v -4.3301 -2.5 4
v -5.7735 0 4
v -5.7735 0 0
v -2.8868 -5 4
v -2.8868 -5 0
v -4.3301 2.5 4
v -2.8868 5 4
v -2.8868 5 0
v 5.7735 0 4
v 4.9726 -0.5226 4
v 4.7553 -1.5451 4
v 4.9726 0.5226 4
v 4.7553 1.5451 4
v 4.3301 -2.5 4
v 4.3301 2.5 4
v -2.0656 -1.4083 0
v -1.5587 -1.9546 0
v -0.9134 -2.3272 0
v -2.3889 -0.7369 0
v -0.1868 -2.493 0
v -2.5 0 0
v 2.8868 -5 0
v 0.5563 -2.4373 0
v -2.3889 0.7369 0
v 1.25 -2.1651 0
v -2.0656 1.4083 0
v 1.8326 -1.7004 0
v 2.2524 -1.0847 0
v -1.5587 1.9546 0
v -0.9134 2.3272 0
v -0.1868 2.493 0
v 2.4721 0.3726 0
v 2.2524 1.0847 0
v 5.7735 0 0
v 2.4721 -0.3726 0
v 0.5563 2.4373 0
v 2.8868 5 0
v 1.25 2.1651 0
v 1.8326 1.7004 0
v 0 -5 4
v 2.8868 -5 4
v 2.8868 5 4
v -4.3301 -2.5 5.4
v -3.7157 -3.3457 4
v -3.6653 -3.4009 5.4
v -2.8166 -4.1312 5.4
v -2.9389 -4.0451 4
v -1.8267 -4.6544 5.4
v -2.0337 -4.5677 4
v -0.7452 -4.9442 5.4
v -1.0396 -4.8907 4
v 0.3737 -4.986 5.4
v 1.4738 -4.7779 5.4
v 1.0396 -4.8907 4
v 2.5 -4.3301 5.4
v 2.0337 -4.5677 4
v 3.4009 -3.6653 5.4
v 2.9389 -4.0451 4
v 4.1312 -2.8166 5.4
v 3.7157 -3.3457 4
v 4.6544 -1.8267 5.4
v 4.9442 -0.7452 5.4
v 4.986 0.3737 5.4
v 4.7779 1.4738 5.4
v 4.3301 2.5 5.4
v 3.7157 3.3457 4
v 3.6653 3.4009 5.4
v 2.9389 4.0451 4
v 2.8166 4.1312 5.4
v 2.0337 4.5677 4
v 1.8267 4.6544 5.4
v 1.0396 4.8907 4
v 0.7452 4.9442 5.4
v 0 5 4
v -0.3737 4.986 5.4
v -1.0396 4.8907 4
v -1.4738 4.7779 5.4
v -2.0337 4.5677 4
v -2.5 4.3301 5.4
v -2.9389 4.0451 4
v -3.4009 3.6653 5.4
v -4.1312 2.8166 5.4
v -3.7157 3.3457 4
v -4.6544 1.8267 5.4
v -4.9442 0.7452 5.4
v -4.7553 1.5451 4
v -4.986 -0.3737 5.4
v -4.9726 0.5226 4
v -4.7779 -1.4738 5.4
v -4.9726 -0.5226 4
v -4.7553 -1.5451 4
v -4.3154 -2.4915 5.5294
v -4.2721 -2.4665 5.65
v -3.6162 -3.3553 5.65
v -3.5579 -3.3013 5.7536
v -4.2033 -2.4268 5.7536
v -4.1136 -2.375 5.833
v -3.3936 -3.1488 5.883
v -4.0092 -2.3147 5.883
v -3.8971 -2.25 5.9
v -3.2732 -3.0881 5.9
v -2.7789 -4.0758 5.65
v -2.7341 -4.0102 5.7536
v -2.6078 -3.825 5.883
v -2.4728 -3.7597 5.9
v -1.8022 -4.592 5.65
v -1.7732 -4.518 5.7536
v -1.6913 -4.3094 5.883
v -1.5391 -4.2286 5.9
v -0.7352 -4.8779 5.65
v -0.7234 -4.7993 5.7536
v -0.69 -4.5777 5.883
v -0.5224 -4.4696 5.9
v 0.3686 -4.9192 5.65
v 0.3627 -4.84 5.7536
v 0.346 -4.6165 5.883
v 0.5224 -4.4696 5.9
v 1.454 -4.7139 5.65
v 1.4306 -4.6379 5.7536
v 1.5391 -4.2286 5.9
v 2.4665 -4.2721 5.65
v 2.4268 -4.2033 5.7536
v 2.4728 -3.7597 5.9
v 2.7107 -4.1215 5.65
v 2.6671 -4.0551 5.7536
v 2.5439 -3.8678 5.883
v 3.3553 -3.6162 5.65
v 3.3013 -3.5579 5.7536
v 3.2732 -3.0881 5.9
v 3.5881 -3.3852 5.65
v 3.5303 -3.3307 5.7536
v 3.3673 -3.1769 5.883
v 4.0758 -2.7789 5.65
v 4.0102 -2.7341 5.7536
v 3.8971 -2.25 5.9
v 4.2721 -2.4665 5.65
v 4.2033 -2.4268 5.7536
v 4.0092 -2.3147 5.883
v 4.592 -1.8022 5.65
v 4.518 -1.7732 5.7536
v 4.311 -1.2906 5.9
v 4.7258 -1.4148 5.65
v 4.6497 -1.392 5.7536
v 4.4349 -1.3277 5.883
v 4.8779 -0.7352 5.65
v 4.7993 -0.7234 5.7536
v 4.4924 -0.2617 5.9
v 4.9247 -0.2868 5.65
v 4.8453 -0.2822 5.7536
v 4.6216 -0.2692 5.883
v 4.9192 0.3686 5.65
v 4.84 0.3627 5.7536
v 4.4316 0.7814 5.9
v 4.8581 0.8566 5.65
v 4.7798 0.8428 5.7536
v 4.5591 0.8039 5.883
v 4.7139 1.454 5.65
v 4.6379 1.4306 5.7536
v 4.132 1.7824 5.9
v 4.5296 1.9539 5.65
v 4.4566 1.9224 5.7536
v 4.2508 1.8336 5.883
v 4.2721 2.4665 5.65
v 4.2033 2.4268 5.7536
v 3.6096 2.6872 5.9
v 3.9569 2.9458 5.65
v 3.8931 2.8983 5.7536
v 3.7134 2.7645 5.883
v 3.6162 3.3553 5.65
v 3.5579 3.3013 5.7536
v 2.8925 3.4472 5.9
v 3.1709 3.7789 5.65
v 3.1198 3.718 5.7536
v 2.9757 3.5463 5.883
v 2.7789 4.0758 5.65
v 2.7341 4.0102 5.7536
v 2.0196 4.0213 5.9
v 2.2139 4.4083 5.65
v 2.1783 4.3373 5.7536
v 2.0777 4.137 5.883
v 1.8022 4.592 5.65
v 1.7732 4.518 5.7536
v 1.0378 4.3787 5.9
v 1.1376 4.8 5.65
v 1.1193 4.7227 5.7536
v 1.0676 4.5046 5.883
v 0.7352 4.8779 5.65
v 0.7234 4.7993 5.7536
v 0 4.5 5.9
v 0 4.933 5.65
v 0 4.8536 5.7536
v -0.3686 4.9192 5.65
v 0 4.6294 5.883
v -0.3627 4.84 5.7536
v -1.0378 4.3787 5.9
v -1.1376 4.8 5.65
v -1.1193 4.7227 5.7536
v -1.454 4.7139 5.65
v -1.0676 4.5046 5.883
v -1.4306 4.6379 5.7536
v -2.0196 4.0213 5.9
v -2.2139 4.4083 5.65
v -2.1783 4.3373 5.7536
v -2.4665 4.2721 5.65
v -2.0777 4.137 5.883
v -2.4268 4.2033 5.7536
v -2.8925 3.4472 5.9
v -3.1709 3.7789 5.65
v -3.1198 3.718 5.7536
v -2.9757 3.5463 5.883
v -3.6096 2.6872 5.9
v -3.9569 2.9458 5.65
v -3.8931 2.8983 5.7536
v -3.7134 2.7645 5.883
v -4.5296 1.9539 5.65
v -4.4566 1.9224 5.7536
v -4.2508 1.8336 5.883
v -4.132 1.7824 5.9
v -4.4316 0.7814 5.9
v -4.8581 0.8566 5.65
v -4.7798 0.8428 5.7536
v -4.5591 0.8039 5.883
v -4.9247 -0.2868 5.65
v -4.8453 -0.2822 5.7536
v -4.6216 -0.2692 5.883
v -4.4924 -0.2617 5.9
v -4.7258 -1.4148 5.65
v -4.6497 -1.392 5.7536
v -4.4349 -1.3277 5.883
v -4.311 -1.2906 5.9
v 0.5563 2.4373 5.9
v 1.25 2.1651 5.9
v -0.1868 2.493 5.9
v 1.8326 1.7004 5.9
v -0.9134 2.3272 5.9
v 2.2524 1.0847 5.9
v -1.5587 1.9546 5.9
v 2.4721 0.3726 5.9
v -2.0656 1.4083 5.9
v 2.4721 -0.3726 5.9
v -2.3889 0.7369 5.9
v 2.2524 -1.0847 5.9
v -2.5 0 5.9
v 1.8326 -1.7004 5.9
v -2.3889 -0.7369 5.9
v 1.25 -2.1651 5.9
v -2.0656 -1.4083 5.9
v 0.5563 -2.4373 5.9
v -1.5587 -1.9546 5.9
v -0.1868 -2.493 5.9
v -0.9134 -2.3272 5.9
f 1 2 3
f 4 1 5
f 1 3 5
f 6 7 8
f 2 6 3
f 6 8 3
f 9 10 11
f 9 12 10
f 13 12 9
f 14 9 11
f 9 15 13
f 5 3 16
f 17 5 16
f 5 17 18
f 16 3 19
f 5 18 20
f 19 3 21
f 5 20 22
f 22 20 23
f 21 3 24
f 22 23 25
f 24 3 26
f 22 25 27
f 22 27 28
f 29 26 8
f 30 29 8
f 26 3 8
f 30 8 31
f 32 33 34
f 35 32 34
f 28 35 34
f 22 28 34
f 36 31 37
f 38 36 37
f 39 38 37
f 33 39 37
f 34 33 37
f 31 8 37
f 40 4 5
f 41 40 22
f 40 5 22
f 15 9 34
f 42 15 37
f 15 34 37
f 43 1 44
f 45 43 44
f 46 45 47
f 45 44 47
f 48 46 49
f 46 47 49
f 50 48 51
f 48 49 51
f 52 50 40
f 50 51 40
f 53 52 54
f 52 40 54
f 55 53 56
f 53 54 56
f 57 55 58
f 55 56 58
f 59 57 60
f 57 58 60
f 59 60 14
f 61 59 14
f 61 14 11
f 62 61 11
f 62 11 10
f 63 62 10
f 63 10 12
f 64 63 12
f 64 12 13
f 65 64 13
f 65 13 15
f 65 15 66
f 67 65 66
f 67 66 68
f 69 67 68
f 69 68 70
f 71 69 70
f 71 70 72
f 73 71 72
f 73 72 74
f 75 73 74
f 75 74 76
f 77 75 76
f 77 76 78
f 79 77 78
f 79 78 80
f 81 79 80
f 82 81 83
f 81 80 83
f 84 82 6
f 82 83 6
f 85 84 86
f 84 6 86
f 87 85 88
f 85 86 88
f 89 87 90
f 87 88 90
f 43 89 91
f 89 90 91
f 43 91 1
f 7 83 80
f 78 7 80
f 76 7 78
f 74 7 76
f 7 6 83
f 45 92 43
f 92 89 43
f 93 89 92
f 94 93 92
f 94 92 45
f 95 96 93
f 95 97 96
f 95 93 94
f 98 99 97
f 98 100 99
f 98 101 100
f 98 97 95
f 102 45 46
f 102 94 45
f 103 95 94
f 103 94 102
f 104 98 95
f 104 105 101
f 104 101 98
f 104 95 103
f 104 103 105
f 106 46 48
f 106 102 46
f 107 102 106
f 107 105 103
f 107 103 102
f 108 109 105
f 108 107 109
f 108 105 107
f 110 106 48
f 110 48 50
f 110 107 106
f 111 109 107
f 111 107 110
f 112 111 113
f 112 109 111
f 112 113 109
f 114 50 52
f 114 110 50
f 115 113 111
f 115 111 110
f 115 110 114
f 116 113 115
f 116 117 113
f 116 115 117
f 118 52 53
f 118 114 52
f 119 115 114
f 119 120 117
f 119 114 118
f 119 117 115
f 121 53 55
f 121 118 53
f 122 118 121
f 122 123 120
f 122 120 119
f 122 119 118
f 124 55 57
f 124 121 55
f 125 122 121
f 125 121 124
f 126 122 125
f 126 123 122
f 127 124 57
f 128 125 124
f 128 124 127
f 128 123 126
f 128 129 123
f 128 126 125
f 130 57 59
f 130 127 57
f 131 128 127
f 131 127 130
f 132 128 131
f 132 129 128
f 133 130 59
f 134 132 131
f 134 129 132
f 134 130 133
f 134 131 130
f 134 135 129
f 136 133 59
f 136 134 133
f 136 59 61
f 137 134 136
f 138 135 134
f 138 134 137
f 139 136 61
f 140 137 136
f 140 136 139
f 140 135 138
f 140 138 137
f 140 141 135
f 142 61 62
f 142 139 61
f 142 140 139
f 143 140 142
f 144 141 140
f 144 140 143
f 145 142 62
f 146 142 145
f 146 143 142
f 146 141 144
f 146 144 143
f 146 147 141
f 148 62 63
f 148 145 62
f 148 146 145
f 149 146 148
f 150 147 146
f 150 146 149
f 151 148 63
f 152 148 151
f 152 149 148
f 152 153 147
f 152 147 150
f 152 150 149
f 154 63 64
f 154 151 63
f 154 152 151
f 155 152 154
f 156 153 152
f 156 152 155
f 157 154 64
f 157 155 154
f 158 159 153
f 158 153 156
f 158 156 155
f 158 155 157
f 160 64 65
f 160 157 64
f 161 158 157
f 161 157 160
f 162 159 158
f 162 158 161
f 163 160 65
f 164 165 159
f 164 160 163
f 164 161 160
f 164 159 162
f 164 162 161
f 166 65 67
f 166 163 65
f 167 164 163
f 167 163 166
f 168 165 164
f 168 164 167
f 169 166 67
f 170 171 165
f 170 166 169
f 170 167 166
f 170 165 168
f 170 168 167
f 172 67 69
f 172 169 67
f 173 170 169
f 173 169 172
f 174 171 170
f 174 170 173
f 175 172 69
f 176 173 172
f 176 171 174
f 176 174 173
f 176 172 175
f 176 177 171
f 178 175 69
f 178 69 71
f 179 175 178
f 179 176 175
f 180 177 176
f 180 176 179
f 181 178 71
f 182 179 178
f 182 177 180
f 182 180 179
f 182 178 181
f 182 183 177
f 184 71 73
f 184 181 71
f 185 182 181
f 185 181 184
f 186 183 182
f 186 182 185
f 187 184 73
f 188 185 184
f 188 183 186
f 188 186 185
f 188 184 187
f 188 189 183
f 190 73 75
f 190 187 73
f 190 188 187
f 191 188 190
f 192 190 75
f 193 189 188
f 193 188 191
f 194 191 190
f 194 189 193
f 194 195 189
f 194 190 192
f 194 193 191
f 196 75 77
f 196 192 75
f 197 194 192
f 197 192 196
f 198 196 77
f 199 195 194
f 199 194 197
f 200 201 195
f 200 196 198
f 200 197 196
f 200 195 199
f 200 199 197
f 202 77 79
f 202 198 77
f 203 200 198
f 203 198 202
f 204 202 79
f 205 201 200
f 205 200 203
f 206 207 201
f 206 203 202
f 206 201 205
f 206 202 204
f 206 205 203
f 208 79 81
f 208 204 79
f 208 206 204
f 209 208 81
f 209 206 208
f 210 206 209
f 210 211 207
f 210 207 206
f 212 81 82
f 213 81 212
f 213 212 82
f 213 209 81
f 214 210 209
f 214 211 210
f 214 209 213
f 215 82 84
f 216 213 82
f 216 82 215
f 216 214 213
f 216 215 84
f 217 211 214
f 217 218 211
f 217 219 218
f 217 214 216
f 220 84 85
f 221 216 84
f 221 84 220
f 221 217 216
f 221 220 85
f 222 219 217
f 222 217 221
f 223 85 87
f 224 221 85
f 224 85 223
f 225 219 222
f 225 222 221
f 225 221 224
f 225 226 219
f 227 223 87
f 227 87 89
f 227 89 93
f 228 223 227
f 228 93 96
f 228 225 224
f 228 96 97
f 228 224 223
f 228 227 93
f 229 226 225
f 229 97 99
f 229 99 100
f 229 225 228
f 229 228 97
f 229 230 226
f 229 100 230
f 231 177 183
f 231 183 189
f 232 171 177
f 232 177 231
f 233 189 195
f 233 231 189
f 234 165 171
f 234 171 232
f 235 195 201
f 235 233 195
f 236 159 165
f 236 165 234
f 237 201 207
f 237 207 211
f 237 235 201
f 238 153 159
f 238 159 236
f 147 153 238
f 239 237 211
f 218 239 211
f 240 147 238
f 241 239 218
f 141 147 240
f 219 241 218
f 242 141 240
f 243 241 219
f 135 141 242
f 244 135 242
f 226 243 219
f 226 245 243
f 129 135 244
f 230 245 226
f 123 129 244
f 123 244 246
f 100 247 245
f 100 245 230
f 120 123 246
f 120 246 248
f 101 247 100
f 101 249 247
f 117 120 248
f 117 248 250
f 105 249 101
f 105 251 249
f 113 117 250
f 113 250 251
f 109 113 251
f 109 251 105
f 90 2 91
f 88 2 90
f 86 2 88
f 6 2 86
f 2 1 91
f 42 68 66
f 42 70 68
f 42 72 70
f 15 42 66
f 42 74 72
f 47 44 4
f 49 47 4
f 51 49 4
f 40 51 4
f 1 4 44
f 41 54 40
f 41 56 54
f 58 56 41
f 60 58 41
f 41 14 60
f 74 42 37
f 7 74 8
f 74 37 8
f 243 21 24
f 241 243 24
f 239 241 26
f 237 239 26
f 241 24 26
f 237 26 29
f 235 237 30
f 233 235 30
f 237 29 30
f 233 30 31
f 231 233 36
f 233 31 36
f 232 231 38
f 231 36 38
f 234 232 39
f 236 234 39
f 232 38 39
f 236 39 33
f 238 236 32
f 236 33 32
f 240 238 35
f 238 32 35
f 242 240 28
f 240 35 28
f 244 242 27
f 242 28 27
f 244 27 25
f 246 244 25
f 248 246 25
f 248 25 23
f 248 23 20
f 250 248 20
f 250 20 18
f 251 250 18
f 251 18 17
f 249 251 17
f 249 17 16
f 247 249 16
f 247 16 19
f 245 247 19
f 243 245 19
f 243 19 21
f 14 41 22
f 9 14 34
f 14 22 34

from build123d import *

# Parameters (mm, degrees)
EXTRUDE_1_DEPTH    = 4
SKETCH_2_R         = 5
EXTRUDE_2_DEPTH    = 1.9
HOLE_WIZARD_M6_1_D = 5
FILLET_1_R         = 0.5


with BuildPart() as part:
    # 草图1 → 凸台-拉伸1 (new body)
    with BuildSketch(Plane.XY):
        Polygon((5.773502692, 0), (2.886751346, 5), (-2.886751346, 5), (-5.773502692, 0), (-2.886751346, -5), (2.886751346, -5), align=None)
    extrude(amount=EXTRUDE_1_DEPTH)

    # 草图2 → 凸台-拉伸2 (add)
    with BuildSketch(Plane.XY.offset(4)):
        with Locations(Location((0, 0, 0), (0, 0, 210))):
            Circle(SKETCH_2_R)
    extrude(amount=EXTRUDE_2_DEPTH)

    # M6 螺纹孔1 (through all)
    with Locations(Plane.XY.offset(5.9)):
        with Locations((0, 0)):
            Hole(HOLE_WIZARD_M6_1_D / 2)

    # 圆角1
    fillet_1_edges = [part.edges().sort_by_distance(p)[0] for p in [
        (4.330127019, 2.5, 5.9),
    ]]
    fillet(fillet_1_edges, radius=FILLET_1_R)


solid = part.part
